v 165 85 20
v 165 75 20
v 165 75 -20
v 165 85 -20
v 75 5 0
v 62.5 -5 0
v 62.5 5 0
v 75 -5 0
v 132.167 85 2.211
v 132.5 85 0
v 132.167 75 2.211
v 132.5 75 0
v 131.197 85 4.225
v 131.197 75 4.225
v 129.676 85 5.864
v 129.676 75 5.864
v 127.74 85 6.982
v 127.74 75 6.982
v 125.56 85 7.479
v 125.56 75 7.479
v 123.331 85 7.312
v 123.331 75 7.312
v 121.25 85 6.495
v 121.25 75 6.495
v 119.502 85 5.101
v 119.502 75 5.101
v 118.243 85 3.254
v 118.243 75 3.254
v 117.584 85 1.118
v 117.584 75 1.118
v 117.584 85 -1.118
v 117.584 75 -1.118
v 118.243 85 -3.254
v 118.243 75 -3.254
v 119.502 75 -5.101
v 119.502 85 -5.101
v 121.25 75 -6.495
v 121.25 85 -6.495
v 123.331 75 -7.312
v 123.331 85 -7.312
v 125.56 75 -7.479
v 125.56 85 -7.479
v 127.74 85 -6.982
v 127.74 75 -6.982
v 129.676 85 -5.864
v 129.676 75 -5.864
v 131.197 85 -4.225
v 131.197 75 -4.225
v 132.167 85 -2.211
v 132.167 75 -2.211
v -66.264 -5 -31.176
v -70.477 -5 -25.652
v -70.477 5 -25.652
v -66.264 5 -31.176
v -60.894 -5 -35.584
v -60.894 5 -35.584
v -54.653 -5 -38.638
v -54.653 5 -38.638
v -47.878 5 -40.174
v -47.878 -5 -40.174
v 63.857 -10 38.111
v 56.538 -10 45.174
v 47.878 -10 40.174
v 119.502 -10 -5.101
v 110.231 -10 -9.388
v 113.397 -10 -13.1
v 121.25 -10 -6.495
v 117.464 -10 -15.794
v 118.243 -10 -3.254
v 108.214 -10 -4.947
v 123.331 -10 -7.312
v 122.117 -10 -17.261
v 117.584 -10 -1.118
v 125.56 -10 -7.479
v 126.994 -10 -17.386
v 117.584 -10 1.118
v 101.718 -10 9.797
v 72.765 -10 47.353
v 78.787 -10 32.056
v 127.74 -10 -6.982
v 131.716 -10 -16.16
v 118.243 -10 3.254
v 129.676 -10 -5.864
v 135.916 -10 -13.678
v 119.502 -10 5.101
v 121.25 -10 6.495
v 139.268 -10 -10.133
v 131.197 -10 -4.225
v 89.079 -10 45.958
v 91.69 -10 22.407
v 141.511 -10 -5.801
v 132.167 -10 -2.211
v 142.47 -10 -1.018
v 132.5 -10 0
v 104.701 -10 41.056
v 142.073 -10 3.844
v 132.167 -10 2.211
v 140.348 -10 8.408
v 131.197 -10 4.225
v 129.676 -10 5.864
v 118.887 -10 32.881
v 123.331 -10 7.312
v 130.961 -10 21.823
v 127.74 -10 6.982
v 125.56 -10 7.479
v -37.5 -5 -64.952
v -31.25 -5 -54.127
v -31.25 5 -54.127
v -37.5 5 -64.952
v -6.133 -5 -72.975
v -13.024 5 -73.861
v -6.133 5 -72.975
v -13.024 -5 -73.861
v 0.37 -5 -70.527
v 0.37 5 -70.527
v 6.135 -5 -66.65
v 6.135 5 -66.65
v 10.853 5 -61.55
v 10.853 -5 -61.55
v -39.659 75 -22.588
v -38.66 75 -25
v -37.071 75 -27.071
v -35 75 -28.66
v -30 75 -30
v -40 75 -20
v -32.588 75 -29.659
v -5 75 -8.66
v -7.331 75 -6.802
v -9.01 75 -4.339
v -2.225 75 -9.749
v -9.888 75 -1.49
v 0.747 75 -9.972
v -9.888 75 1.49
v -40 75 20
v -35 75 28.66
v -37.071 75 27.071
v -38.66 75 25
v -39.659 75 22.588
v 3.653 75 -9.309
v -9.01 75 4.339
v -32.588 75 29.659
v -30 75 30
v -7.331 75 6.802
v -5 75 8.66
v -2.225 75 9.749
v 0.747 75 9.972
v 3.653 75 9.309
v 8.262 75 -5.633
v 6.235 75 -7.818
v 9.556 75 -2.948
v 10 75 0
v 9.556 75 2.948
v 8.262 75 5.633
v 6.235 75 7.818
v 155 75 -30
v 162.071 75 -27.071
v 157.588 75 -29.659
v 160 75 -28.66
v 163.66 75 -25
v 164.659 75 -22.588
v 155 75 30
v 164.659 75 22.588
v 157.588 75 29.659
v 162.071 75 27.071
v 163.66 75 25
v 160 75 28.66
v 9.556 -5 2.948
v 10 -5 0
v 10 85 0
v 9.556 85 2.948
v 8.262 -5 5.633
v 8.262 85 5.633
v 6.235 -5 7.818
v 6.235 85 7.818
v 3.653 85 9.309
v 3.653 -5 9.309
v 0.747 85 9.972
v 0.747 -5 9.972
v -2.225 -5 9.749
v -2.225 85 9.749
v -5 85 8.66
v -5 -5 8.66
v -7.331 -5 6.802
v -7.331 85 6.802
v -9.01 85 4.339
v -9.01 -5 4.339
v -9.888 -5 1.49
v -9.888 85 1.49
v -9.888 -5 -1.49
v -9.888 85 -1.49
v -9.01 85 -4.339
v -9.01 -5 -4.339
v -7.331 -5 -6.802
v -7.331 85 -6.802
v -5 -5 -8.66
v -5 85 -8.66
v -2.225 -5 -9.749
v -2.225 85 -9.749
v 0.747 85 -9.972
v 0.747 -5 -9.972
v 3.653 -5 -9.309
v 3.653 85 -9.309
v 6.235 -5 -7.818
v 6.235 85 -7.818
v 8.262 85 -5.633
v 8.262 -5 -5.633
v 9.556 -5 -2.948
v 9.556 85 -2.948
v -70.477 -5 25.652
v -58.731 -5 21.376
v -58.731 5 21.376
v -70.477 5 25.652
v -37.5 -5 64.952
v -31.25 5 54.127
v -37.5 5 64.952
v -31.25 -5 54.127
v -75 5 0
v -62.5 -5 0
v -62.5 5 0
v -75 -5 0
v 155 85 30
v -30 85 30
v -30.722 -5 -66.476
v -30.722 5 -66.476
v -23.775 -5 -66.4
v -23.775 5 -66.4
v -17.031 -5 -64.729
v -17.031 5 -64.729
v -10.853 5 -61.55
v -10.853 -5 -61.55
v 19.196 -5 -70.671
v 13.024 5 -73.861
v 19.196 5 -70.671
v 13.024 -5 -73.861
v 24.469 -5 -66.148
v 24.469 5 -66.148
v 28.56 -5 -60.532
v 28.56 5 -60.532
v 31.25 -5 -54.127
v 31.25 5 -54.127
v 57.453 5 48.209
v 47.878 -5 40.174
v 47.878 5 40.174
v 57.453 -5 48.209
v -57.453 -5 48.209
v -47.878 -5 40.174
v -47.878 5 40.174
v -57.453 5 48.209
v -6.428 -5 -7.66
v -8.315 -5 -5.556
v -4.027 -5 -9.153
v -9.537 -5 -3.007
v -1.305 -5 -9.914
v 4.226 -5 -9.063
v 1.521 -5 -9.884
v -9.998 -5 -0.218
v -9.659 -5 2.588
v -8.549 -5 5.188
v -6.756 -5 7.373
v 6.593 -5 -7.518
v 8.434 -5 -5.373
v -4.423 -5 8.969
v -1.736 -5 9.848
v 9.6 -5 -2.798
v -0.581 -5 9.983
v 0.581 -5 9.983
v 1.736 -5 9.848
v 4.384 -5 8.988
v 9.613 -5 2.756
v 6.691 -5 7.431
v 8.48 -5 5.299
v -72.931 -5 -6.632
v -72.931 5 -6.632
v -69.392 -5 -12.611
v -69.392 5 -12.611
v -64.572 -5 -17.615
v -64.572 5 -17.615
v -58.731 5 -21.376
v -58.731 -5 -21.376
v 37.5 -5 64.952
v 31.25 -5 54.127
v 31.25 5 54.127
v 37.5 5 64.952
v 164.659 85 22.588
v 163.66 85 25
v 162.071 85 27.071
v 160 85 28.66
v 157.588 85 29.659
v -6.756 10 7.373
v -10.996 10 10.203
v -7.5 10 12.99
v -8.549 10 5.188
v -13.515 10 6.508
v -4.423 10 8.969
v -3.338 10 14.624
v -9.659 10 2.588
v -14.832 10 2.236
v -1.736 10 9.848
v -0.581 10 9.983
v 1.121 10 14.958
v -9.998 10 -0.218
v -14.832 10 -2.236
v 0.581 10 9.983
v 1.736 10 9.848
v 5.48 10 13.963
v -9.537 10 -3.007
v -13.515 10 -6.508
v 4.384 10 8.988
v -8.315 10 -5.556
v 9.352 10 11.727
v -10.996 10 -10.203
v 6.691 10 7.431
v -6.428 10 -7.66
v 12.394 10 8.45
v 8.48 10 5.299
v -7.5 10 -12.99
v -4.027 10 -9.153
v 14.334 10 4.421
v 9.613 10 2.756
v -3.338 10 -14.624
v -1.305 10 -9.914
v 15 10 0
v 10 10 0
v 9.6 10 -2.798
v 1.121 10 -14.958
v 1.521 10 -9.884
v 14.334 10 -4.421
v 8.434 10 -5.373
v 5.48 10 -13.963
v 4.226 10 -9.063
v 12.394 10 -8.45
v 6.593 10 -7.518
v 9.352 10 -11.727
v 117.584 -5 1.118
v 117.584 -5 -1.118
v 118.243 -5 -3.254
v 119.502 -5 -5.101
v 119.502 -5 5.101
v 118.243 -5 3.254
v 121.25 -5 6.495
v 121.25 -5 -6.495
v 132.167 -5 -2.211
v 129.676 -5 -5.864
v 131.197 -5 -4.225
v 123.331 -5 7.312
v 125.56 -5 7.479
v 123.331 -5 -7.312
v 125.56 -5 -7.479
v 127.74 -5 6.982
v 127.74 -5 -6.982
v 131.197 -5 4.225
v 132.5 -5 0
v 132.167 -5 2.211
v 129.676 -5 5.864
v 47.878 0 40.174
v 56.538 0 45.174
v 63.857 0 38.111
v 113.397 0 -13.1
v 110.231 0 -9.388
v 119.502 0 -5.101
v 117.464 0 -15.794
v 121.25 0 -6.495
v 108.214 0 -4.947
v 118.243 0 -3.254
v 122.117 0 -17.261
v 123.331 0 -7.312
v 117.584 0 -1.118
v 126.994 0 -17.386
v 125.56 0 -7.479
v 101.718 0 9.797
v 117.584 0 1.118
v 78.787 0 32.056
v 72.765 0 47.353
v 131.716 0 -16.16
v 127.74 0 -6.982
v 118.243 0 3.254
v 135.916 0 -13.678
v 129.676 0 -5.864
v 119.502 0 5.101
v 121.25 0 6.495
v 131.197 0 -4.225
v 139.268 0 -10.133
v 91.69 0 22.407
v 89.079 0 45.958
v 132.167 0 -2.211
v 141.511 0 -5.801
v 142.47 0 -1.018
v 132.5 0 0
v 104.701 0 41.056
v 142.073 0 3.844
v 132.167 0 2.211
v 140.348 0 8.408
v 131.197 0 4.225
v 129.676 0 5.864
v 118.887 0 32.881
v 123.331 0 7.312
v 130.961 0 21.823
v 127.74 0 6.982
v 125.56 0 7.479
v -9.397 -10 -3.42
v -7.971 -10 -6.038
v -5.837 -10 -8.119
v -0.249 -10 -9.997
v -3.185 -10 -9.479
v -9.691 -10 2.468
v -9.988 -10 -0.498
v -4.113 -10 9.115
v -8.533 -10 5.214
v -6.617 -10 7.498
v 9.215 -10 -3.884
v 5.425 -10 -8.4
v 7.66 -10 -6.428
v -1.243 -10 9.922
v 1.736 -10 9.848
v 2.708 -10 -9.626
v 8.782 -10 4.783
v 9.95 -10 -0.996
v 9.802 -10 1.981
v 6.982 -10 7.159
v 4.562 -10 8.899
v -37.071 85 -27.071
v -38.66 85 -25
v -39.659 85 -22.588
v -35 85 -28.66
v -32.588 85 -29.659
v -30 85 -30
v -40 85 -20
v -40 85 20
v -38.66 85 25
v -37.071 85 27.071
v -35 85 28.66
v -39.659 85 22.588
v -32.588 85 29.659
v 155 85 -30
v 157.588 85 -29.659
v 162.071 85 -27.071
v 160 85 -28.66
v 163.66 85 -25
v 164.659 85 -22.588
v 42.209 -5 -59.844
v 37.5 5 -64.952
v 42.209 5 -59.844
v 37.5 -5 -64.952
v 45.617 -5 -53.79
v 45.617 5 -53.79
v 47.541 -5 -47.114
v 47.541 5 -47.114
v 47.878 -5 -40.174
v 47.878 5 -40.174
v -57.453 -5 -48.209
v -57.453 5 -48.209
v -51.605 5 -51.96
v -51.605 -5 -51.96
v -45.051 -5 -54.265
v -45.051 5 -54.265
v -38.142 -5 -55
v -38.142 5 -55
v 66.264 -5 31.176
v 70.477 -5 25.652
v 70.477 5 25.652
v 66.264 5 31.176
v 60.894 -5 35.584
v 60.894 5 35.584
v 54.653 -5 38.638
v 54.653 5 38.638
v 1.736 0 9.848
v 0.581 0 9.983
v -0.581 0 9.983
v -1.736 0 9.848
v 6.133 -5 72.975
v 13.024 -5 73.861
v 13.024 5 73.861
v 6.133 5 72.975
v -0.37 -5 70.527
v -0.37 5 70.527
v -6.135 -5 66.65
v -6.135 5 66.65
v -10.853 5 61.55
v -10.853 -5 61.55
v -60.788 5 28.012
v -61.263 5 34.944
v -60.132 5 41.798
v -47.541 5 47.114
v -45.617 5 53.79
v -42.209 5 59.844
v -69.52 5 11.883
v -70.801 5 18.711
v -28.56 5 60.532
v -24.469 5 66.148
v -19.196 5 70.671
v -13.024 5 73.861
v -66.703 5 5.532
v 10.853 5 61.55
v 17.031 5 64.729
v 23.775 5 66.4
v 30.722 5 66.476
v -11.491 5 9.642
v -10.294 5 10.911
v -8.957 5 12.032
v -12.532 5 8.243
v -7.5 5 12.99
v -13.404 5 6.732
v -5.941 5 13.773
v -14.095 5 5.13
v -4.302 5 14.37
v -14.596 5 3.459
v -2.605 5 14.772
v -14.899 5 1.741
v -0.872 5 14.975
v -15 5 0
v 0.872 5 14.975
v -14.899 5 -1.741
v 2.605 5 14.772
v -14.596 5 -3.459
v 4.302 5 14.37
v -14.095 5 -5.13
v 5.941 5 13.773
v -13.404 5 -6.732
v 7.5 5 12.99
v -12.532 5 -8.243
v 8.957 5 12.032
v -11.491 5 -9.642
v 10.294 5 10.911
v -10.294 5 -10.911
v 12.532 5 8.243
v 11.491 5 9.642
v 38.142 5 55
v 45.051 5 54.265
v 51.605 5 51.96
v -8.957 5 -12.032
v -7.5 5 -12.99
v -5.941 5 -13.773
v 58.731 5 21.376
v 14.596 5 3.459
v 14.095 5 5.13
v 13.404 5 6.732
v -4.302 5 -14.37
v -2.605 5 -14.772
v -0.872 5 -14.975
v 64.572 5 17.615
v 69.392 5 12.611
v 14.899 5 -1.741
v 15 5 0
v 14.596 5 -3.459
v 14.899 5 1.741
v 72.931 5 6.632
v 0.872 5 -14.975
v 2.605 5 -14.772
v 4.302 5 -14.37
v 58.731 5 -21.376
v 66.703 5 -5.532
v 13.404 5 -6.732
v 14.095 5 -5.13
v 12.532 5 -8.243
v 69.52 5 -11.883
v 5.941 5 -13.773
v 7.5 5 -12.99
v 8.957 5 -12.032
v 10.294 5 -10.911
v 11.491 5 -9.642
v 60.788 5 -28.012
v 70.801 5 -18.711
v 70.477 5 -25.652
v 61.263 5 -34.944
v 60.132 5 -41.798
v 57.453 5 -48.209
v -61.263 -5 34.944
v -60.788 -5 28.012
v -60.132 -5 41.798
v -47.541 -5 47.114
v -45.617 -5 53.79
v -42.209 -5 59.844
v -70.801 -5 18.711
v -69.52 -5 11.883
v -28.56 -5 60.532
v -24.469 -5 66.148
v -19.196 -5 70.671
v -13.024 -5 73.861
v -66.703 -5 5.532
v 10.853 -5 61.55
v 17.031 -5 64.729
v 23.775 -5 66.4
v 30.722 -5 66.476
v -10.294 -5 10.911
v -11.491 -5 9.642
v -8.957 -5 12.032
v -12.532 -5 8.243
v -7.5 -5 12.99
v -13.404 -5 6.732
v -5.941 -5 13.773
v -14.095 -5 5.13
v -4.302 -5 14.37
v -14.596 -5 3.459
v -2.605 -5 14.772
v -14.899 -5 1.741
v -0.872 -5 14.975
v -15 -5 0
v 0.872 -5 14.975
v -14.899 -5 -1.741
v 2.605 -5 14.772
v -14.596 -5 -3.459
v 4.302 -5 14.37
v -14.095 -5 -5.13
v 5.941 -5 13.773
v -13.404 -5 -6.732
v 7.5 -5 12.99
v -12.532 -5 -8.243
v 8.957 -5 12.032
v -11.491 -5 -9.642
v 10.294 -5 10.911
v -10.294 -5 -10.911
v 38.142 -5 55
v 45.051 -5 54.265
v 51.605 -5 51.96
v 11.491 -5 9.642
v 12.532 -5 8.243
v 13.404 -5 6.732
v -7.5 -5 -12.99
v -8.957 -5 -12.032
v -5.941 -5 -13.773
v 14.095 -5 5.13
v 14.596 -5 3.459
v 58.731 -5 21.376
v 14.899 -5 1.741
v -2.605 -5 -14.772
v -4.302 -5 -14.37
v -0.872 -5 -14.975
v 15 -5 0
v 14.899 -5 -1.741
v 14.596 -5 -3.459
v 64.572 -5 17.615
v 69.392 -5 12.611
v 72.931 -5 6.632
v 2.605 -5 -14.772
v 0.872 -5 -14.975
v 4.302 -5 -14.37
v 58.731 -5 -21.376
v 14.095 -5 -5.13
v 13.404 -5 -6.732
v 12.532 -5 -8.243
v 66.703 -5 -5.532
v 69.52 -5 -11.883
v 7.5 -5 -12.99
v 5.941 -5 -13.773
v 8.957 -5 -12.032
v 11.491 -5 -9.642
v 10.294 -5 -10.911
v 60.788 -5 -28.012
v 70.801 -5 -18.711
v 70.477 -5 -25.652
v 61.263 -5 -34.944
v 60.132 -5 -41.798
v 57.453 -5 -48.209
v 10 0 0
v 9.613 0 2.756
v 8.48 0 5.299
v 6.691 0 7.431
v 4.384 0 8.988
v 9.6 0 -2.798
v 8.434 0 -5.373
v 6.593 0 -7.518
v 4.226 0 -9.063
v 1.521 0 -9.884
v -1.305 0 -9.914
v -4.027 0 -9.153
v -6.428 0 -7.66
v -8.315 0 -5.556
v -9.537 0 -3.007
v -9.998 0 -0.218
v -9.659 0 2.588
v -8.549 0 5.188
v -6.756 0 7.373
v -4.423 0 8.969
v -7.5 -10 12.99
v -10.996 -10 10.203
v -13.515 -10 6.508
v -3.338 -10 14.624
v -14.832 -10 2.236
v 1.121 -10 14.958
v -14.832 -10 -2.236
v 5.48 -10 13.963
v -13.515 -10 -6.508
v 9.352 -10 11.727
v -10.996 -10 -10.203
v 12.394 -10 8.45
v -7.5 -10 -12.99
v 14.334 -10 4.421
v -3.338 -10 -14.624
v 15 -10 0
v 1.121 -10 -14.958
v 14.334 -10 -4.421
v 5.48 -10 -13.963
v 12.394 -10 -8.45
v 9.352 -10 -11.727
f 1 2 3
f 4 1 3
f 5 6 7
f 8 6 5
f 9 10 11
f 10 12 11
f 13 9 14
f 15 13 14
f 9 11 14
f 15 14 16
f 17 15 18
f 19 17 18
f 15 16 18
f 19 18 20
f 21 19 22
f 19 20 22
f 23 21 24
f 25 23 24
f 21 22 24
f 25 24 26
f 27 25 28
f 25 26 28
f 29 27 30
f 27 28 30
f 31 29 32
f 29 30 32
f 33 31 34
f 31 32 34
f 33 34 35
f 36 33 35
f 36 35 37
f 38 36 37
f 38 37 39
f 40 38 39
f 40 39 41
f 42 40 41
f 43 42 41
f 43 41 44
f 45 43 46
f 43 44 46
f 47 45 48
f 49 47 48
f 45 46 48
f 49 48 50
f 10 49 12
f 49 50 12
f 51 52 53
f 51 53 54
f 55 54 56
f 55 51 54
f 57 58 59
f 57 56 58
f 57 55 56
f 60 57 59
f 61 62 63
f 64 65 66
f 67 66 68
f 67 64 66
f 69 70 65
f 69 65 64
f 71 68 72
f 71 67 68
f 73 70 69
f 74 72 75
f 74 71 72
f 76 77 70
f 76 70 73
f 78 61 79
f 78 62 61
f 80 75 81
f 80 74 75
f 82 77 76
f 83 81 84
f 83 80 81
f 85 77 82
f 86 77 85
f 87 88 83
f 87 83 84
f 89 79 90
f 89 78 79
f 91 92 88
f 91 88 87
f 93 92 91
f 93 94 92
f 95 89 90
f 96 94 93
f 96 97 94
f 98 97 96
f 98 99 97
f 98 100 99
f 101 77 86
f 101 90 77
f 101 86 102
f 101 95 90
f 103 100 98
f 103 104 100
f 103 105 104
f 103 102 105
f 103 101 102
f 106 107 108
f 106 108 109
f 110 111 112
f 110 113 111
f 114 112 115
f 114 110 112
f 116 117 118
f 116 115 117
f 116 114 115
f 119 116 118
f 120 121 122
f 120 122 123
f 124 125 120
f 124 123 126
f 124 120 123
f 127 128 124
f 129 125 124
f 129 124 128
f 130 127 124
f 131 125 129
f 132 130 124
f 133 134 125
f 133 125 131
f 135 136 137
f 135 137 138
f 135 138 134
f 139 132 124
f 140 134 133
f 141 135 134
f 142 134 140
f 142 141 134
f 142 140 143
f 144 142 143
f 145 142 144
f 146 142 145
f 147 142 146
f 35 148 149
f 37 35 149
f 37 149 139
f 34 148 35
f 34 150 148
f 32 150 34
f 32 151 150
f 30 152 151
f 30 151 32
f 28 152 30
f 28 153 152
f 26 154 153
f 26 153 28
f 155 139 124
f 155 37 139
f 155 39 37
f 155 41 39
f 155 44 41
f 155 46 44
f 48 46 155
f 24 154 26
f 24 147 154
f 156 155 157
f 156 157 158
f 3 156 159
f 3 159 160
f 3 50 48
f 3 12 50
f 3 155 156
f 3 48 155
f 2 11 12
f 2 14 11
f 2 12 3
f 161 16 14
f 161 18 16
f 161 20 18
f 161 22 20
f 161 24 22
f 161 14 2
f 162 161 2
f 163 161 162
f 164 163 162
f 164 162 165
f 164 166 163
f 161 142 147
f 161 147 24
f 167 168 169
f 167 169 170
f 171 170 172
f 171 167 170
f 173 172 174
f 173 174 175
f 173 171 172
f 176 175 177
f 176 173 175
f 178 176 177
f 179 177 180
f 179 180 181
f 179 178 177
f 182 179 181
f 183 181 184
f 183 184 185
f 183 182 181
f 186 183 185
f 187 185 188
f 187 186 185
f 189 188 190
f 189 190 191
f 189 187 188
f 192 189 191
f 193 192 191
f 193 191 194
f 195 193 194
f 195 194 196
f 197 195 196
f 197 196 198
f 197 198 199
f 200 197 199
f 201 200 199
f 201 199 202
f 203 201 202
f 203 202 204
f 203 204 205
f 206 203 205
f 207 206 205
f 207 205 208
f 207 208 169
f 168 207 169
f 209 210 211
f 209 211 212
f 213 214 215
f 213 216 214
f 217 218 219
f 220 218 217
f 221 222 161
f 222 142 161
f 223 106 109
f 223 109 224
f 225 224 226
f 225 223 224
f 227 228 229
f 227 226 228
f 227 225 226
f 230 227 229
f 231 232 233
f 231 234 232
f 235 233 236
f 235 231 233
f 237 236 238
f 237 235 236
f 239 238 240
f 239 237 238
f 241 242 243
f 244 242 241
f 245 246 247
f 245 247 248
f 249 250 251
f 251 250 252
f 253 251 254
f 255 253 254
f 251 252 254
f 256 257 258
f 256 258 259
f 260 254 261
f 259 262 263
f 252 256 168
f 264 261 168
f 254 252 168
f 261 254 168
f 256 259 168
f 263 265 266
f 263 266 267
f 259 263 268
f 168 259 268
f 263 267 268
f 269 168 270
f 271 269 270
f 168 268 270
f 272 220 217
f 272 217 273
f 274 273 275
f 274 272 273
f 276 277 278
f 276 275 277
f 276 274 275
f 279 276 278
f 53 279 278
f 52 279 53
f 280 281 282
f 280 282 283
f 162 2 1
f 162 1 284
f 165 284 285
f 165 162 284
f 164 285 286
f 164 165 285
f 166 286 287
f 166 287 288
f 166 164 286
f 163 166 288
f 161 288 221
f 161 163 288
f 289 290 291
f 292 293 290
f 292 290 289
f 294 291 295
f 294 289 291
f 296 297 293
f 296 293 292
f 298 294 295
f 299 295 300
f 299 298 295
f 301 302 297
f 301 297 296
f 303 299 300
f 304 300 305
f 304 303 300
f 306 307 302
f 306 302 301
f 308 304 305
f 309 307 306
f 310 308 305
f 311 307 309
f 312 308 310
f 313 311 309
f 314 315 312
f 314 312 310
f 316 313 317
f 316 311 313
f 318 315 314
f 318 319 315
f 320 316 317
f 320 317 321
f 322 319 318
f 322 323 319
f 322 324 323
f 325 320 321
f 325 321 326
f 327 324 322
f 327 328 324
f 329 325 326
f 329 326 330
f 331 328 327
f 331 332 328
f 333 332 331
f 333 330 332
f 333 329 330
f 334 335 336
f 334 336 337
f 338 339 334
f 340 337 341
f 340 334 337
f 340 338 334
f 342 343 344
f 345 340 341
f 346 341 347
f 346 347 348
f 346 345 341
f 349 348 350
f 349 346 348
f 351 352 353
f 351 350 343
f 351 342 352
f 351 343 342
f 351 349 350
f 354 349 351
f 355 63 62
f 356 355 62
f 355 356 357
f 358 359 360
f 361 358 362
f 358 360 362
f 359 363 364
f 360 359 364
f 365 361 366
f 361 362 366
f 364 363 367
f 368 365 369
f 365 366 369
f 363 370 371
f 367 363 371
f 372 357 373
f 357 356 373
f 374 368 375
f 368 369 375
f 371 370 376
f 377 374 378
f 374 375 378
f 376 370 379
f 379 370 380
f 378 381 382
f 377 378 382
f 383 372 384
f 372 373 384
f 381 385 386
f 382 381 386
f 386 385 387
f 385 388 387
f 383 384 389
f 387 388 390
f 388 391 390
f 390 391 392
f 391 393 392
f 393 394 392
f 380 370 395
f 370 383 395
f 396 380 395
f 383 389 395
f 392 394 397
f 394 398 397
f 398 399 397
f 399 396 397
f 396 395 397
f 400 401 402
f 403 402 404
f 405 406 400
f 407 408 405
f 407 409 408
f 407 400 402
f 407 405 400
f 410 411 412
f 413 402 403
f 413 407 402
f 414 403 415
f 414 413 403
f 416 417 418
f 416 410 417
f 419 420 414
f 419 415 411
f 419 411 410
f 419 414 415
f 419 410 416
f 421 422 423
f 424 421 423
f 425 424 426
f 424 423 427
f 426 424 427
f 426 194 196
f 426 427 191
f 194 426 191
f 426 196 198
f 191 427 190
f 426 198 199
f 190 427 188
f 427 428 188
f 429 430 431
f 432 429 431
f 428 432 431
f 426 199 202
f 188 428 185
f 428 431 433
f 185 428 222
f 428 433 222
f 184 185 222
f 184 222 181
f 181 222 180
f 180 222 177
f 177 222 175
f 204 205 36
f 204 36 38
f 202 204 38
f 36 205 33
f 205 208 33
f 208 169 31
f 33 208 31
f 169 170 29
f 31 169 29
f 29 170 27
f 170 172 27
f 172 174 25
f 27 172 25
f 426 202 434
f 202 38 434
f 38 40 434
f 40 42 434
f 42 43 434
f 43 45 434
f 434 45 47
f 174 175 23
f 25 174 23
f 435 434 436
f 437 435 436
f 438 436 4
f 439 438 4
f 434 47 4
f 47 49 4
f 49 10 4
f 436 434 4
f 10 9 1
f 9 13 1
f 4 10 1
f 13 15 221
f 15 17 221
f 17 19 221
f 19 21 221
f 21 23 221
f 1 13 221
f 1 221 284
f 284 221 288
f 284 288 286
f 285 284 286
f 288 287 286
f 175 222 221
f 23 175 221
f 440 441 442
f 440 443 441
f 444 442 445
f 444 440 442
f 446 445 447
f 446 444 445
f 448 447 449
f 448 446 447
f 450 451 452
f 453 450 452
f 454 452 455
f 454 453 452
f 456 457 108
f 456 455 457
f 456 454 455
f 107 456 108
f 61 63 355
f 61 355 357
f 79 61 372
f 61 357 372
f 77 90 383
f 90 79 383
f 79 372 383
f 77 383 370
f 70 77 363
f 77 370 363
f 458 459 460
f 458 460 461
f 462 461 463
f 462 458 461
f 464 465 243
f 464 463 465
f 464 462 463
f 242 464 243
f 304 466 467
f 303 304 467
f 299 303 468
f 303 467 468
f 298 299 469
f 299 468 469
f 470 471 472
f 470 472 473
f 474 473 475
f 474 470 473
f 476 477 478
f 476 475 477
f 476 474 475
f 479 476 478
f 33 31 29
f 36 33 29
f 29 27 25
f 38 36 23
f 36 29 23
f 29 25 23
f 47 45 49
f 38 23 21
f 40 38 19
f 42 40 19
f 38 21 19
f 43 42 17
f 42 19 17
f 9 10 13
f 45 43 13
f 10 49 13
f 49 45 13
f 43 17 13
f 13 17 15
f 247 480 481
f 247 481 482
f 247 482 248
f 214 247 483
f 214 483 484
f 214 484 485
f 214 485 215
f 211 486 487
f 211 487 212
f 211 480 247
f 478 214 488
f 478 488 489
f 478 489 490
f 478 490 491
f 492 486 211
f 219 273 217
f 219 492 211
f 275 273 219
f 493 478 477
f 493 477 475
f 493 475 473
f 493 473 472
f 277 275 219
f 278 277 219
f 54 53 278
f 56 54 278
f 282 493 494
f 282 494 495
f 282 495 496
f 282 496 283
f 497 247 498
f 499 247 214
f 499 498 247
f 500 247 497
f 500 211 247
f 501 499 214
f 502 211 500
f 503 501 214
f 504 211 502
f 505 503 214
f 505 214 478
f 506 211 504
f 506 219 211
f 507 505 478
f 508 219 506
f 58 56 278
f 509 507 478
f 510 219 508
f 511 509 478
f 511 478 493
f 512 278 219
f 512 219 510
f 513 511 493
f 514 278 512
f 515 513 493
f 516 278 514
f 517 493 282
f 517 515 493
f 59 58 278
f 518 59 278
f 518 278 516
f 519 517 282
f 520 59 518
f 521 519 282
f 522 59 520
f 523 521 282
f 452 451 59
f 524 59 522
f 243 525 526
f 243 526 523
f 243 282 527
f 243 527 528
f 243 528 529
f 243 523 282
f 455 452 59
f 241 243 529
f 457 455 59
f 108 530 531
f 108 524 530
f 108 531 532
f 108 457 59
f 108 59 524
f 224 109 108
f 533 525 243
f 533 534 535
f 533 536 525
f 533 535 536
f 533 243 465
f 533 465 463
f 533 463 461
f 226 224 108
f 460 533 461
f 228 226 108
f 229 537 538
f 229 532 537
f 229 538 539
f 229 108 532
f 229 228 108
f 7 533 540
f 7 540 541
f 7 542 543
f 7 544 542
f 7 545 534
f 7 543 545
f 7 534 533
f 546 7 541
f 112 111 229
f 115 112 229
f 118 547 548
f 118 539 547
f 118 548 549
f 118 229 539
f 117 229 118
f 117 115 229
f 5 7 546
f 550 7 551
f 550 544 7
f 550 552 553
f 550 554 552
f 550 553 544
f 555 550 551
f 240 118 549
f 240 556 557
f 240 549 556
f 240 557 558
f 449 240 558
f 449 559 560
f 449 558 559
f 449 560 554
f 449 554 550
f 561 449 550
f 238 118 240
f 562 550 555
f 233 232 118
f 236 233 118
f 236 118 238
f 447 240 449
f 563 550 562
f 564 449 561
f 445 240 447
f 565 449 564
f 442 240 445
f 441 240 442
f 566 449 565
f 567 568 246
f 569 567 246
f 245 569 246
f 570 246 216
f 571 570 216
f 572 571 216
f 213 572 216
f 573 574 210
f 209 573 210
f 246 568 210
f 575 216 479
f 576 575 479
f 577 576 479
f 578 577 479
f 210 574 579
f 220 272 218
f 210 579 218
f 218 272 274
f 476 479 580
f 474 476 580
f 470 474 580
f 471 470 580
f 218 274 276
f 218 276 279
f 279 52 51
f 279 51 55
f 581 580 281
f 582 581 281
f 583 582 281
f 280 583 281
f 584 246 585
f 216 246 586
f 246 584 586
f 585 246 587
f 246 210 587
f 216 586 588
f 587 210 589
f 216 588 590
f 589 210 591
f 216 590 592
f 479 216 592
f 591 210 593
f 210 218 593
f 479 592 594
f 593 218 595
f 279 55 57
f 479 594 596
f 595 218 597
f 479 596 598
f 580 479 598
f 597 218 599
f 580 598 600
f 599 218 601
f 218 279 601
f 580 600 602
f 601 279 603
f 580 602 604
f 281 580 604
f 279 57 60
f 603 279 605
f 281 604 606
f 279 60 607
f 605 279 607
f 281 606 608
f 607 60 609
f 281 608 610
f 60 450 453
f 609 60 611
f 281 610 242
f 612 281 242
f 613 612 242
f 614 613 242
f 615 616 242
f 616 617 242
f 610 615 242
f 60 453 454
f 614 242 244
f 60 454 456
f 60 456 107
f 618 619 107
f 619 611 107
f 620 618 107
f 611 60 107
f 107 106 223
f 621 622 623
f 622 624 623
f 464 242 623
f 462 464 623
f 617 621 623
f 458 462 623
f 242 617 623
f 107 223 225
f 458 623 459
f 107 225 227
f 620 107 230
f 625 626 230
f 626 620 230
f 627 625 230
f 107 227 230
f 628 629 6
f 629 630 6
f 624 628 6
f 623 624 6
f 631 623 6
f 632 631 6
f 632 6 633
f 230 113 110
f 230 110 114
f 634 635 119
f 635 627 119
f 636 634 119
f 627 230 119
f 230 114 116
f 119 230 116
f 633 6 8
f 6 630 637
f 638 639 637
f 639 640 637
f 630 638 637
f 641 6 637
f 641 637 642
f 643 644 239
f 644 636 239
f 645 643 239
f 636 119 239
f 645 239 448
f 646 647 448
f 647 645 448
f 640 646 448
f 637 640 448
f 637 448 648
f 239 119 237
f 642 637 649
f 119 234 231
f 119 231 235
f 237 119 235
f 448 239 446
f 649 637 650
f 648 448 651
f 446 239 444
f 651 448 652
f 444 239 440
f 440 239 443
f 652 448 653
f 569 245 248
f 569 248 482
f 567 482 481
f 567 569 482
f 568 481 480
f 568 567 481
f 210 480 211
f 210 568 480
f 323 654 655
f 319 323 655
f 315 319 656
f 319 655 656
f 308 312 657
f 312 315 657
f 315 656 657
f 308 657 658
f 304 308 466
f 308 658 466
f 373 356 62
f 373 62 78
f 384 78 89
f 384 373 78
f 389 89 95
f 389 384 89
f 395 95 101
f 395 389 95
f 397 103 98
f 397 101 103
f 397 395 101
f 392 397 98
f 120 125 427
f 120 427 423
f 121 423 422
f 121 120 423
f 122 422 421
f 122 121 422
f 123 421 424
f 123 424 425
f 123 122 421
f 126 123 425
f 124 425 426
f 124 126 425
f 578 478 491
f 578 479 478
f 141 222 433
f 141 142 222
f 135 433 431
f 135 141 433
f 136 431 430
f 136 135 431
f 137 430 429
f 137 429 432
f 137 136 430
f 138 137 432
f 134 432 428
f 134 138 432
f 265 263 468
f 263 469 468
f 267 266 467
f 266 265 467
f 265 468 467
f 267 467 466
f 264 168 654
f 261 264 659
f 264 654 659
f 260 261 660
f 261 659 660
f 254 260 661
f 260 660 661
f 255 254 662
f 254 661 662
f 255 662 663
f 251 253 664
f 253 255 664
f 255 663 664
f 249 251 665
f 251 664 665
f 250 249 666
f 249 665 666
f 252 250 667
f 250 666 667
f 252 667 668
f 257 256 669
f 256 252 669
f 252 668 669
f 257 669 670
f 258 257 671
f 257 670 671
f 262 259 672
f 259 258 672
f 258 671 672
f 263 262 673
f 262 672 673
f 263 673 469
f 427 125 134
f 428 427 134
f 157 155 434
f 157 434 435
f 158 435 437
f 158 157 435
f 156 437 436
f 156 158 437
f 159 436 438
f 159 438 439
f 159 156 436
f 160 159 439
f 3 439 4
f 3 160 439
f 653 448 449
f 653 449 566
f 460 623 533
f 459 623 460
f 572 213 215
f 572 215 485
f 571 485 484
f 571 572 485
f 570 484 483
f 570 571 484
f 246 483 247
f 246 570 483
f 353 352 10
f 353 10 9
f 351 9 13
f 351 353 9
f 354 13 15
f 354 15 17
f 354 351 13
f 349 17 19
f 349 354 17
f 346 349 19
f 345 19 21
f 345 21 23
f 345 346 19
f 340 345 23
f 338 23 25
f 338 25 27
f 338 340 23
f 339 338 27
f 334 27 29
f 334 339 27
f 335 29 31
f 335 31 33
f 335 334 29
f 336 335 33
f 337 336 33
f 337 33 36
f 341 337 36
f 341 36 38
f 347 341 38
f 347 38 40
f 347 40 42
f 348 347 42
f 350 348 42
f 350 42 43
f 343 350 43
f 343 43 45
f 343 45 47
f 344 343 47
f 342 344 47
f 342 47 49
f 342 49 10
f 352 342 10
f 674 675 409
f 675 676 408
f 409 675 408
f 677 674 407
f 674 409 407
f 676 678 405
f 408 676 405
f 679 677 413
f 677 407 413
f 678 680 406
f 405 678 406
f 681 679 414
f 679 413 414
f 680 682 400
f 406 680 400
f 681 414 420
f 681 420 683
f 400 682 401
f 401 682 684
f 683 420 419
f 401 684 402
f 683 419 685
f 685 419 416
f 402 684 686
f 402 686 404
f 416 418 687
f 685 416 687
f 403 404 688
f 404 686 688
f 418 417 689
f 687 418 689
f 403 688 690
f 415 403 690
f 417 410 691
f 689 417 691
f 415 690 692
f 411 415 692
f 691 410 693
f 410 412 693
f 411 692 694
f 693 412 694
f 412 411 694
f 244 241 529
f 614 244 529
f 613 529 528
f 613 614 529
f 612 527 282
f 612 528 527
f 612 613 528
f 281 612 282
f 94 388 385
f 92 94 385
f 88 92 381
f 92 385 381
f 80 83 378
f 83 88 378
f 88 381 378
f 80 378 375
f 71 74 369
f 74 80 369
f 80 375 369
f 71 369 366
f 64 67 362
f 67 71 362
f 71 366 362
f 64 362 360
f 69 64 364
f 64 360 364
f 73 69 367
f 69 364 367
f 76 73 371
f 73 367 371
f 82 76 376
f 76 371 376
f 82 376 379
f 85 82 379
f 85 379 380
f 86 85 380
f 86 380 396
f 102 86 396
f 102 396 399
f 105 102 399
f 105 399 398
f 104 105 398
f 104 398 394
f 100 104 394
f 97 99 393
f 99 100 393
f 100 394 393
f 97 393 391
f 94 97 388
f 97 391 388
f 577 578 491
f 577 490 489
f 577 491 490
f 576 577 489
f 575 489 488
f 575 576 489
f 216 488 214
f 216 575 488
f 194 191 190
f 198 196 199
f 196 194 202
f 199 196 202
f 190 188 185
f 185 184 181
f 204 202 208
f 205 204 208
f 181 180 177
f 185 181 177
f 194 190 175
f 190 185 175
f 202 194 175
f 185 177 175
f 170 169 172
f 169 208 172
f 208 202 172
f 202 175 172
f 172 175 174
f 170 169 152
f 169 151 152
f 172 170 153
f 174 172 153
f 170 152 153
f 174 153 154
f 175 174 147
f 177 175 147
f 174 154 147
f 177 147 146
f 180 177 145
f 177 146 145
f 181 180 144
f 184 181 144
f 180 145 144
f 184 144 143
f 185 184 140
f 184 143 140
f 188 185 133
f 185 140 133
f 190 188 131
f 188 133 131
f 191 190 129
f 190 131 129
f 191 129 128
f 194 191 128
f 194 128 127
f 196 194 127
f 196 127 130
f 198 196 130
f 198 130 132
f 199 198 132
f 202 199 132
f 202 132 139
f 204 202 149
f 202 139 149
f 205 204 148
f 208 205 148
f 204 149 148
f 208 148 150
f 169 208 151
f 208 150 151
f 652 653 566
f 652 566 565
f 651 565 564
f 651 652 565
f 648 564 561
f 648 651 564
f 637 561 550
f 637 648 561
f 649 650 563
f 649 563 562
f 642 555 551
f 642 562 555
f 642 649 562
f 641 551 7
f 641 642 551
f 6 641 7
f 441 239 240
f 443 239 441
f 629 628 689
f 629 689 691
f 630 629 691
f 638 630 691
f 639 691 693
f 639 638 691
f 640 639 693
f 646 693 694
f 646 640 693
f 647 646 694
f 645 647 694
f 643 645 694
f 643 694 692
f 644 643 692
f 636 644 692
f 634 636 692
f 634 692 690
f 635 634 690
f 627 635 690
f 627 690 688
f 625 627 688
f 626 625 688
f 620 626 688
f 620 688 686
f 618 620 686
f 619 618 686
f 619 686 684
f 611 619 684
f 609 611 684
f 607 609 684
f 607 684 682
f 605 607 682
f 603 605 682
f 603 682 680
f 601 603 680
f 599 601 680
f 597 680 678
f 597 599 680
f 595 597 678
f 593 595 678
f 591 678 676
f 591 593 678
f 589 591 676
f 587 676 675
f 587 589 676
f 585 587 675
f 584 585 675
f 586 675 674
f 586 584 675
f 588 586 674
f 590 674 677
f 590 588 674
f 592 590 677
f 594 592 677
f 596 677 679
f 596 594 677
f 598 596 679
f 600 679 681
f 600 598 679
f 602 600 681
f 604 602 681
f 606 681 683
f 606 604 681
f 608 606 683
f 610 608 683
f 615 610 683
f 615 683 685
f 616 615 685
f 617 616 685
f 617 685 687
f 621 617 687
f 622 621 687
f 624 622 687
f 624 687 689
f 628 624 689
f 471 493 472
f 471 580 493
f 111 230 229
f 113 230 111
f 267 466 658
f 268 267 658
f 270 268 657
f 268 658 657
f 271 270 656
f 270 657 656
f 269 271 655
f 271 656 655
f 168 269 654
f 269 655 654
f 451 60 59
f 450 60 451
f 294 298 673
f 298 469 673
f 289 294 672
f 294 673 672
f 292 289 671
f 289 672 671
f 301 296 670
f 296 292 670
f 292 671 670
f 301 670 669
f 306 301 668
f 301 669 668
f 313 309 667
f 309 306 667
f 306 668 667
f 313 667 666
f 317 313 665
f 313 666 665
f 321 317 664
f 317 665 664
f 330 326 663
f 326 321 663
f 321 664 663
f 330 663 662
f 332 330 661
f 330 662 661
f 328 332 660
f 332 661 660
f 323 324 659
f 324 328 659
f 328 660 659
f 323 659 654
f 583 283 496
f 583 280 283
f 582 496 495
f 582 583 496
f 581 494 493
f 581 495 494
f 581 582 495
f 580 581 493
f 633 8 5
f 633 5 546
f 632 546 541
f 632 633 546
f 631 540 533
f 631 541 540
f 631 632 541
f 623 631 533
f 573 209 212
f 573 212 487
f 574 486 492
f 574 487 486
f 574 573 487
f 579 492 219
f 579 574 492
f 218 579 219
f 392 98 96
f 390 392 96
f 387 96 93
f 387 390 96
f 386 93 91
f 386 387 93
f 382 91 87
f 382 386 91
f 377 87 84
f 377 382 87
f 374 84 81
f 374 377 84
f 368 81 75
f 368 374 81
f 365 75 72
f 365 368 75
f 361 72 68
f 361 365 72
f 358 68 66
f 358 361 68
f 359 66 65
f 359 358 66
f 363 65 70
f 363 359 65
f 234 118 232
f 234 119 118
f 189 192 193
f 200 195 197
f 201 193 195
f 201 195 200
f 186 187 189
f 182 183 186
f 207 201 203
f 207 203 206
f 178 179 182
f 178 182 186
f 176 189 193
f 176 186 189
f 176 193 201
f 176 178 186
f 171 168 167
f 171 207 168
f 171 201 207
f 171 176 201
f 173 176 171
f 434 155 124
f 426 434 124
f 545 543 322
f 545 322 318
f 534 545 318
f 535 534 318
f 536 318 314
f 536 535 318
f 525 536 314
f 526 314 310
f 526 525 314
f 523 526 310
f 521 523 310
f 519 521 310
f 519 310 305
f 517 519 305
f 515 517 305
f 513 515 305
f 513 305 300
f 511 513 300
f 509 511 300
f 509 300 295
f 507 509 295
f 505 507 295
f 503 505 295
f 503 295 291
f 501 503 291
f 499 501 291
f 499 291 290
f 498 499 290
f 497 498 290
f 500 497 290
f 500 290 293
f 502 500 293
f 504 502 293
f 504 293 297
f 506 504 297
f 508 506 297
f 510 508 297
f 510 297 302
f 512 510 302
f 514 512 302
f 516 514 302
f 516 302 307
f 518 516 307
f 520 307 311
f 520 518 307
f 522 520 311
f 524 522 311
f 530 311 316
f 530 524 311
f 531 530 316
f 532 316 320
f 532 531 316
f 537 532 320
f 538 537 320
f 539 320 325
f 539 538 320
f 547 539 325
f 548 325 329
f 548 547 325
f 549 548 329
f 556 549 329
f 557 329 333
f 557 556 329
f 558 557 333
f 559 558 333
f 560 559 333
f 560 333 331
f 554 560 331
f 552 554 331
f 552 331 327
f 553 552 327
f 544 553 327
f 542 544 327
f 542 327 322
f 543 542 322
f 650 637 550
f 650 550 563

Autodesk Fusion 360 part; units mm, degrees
sketch "Sketch1" plane through (0, 0, 0) normal (0, 1, 0) x (1, 0, 0) in component "ratchet"
  circle A0 centre (0, 0) radius 62.5
  circle A1 centre (0, 0) radius 10
  circle A2 centre (0, 0) radius 15
  circle A3 centre (0, 0) radius 75
  line L0 (0, 0) -> (13.0236, -73.8606)
  line L1 (0, 0) -> (75, 0) construction
  line L2 (0, 0) -> (-10.853, -61.5505)
  arc A4 (-10.853, -61.5505) -> (13.0236, -73.8606) centre (13.378, -43.8627) ccw
  dimension "d1" = 125
  dimension "d2" = 20
  dimension "d3" = 30
  dimension "d4" = 12.5
  dimension "d5" = 80
  dimension "d6" = 20
  dimension "d7" = 30
extrude "Extrude1" add sketch "Sketch1" along normal mid plane 10 contours A0 A2 L0 L2 | A0 L0 A4 picked at (5.1197, -46.3065) makes body 1 in component "ratchet"
pattern_circular "C-Pattern1" count 18 over 360 about axis through (0, -5, 0) along (0, 1, 0) of bodies 1 makes body 2 at (18.6177, 5, 46.4976) makes body 3 at (33.398, -5, 37.3258) makes body 4 at (44.15, 5, 23.652) makes body 5 at (49.5769, 5, 7.1254) makes body 6 at (49.0241, 5, -10.2606) makes body 7 at (42.5583, 5, -26.409) makes body 8 at (30.9593, 5, -39.3722) makes body 9 at (15.6261, 5, -47.5864) makes body 10 at (-1.5918, 5, -50.0611) makes body 11 at (-18.6177, 5, -46.4976) makes body 12 at (-33.398, 5, -37.3258) makes body 13 at (-44.15, 5, -23.652) makes body 14 at (-49.5769, 5, -7.1254) makes body 15 at (-49.0241, 5, 10.2606) makes body 16 at (-42.5583, 5, 26.409) makes body 17 at (-30.9593, 5, 39.3722) makes body 18 at (-15.6261, 5, 47.5864) in component "ratchet"
extrude "Extrude2" add sketch "Sketch1" along normal mid plane 20 contours A1 A2 L0 L2 | A1 A2 L0 L2 bodies 1 2 3 4 5 6 7 8 9 10 11 12 13 14 15 16 17 18 in component "ratchet"
sketch "Sketch1 (2)" plane through (0, -5, 0) normal (0, -1, 0) x (1, 0, 0) in component "paw"
  line L0 (-31.25, 54.1266) -> (-37.5, 64.9519)
  arc A0 (-37.5, 64.9519) -> (-47.8778, 40.1742) centre (-17.9462, 42.2) ccw
  line L1 (-47.8778, 40.1742) -> (-57.4533, 48.2091)
  arc A1 (-57.4533, 48.2091) -> (-58.7308, 21.3763) centre (-31.2972, 33.517) ccw
  line L2 (-58.7308, 21.3763) -> (-70.4769, 25.6515)
  arc A2 (-70.4769, 25.6515) -> (-62.5, 0) centre (-40.8732, 20.7914) ccw
  line L3 (-62.5, 0) -> (-75, 0)
  arc A3 (-75, 0) -> (-58.7308, -21.3763) centre (-45.5194, 5.5581) ccw
  line L4 (-58.7308, -21.3763) -> (-70.4769, -25.6515)
  arc A4 (-70.4769, -25.6515) -> (-47.8778, -40.1742) centre (-44.6752, -10.3457) ccw
  line L5 (-47.8778, -40.1742) -> (-57.4533, -48.2091)
  arc A5 (-57.4533, -48.2091) -> (-31.25, -54.1266) centre (-38.4425, -25.0016) ccw
  line L6 (-31.25, -54.1266) -> (-37.5, -64.9519)
  arc A6 (-37.5, -64.9519) -> (-10.853, -61.5505) centre (-27.5731, -36.6419) ccw
  line L7 (-10.853, -61.5505) -> (-13.0236, -73.8606)
  arc A7 (-13.0236, -73.8606) -> (10.853, -61.5505) centre (-13.378, -43.8627) ccw
  line L8 (10.853, -61.5505) -> (13.0236, -73.8606)
  arc A8 (13.0236, -73.8606) -> (31.25, -54.1266) centre (2.4307, -45.793) ccw
  line L9 (31.25, -54.1266) -> (37.5, -64.9519)
  arc A9 (37.5, -64.9519) -> (47.8778, -40.1742) centre (17.9462, -42.2) ccw
  line L10 (47.8778, -40.1742) -> (57.4533, -48.2091)
  arc A10 (57.4533, -48.2091) -> (58.7308, -21.3763) centre (31.2972, -33.517) ccw
  line L11 (58.7308, -21.3763) -> (70.4769, -25.6515)
  arc A11 (70.4769, -25.6515) -> (62.5, 0) centre (40.8732, -20.7914) ccw
  line L12 (62.5, 0) -> (75, 0)
  arc A12 (75, 0) -> (58.7308, 21.3763) centre (45.5194, -5.5581) ccw
  line L13 (58.7308, 21.3763) -> (70.4769, 25.6515)
  arc A13 (70.4769, 25.6515) -> (47.8778, 40.1742) centre (44.6752, 10.3457) ccw
  line L14 (47.8778, 40.1742) -> (57.4533, 48.2091)
  arc A14 (57.4533, 48.2091) -> (31.25, 54.1266) centre (38.4425, 25.0016) ccw
  line L15 (31.25, 54.1266) -> (37.5, 64.9519)
  arc A15 (37.5, 64.9519) -> (10.853, 61.5505) centre (27.5731, 36.6419) ccw
  line L16 (10.853, 61.5505) -> (13.0236, 73.8606)
  arc A16 (13.0236, 73.8606) -> (-10.853, 61.5505) centre (13.378, 43.8627) ccw
  line L17 (-10.853, 61.5505) -> (-13.0236, 73.8606)
  arc A17 (-13.0236, 73.8606) -> (-31.25, 54.1266) centre (-2.4307, 45.793) ccw
  circle A18 centre (0, 0) radius 15
  circle A19 centre (0, 0) radius 10
  line L18 (-13.0236, 73.8606) -> (-10.853, 61.5505)
  arc A20 (-13.0236, 73.8606) -> (-31.25, 54.1266) centre (-2.4307, 45.793) ccw
  line L19 (-37.5, 64.9519) -> (-31.25, 54.1266)
  arc A21 (-37.5, 64.9519) -> (-47.8778, 40.1742) centre (-17.9462, 42.2) ccw
  line L20 (-57.4533, 48.2091) -> (-47.8778, 40.1742)
  arc A22 (-57.4533, 48.2091) -> (-58.7308, 21.3763) centre (-31.2972, 33.517) ccw
  line L21 (-70.4769, 25.6515) -> (-58.7308, 21.3763)
  arc A23 (-70.4769, 25.6515) -> (-62.5, 0) centre (-40.8732, 20.7914) ccw
  line L22 (-75, 0) -> (-62.5, 0)
  arc A24 (-75, 0) -> (-58.7308, -21.3763) centre (-45.5194, 5.5581) ccw
  line L23 (-70.4769, -25.6515) -> (-58.7308, -21.3763)
  arc A25 (-70.4769, -25.6515) -> (-47.8778, -40.1742) centre (-44.6752, -10.3457) ccw
  line L24 (-57.4533, -48.2091) -> (-47.8778, -40.1742)
  arc A26 (-57.4533, -48.2091) -> (-31.25, -54.1266) centre (-38.4425, -25.0016) ccw
  line L25 (-37.5, -64.9519) -> (-31.25, -54.1266)
  arc A27 (-37.5, -64.9519) -> (-10.853, -61.5505) centre (-27.5731, -36.6419) ccw
  line L26 (-13.0236, -73.8606) -> (-10.853, -61.5505)
  arc A28 (-13.0236, -73.8606) -> (10.853, -61.5505) centre (-13.378, -43.8627) ccw
  line L27 (13.0236, -73.8606) -> (10.853, -61.5505)
  arc A29 (13.0236, -73.8606) -> (31.25, -54.1266) centre (2.4307, -45.793) ccw
  line L28 (37.5, -64.9519) -> (31.25, -54.1266)
  arc A30 (37.5, -64.9519) -> (47.8778, -40.1742) centre (17.9462, -42.2) ccw
  line L29 (57.4533, -48.2091) -> (47.8778, -40.1742)
  arc A31 (57.4533, -48.2091) -> (58.7308, -21.3763) centre (31.2972, -33.517) ccw
  line L30 (70.4769, -25.6515) -> (58.7308, -21.3763)
  arc A32 (70.4769, -25.6515) -> (62.5, 0) centre (40.8732, -20.7914) ccw
  line L31 (75, 0) -> (62.5, 0)
  arc A33 (75, 0) -> (58.7308, 21.3763) centre (45.5194, -5.5581) ccw
  line L32 (70.4769, 25.6515) -> (58.7308, 21.3763)
  arc A34 (70.4769, 25.6515) -> (47.8778, 40.1742) centre (44.6752, 10.3457) ccw
  line L33 (57.4533, 48.2091) -> (47.8778, 40.1742)
  arc A35 (57.4533, 48.2091) -> (31.25, 54.1266) centre (38.4425, 25.0016) ccw
  line L34 (37.5, 64.9519) -> (31.25, 54.1266)
  arc A36 (37.5, 64.9519) -> (10.853, 61.5505) centre (27.5731, 36.6419) ccw
  line L35 (13.0236, 73.8606) -> (10.853, 61.5505)
  arc A37 (13.0236, 73.8606) -> (-10.853, 61.5505) centre (13.378, 43.8627) ccw
  circle A38 centre (125, 0) radius 7.5
  circle A39 centre (125, 0) radius 17.5
  line L36 (47.8778, 40.1742) -> (149.9857, 40.1742) construction
  line L37 (47.8778, 40.1742) -> (56.538, 45.1742)
  arc A40 (108.2137, -4.9467) -> (47.8778, 40.1742) centre (47.8778, -22.727) ccw
  arc A41 (140.3479, 8.4078) -> (56.538, 45.1742) centre (74.5711, -27.6256) ccw
  dimension "d14" = 15
  dimension "d15" = 35
  dimension "d16" = 10
  dimension "d17" = 125
  dimension "d18" = 75
  dimension "d19" = 30
extrude "Extrude1'" add sketch "Sketch1 (2)" along normal mid plane 10 separate body contours A39 L37 A40 A41 | A39 makes body 19 in component "paw"
sketch "Sketch1 (3)" plane through (0, -5, 0) normal (0, -1, 0) x (1, 0, 0) in component "base"
  line L0 (-31.25, 54.1266) -> (-37.5, 64.9519)
  arc A0 (-37.5, 64.9519) -> (-47.8778, 40.1742) centre (-17.9462, 42.2) ccw
  line L1 (-47.8778, 40.1742) -> (-57.4533, 48.2091)
  arc A1 (-57.4533, 48.2091) -> (-58.7308, 21.3763) centre (-31.2972, 33.517) ccw
  line L2 (-58.7308, 21.3763) -> (-70.4769, 25.6515)
  arc A2 (-70.4769, 25.6515) -> (-62.5, 0) centre (-40.8732, 20.7914) ccw
  line L3 (-62.5, 0) -> (-75, 0)
  arc A3 (-75, 0) -> (-58.7308, -21.3763) centre (-45.5194, 5.5581) ccw
  line L4 (-58.7308, -21.3763) -> (-70.4769, -25.6515)
  arc A4 (-70.4769, -25.6515) -> (-47.8778, -40.1742) centre (-44.6752, -10.3457) ccw
  line L5 (-47.8778, -40.1742) -> (-57.4533, -48.2091)
  arc A5 (-57.4533, -48.2091) -> (-31.25, -54.1266) centre (-38.4425, -25.0016) ccw
  line L6 (-31.25, -54.1266) -> (-37.5, -64.9519)
  arc A6 (-37.5, -64.9519) -> (-10.853, -61.5505) centre (-27.5731, -36.6419) ccw
  line L7 (-10.853, -61.5505) -> (-13.0236, -73.8606)
  arc A7 (-13.0236, -73.8606) -> (10.853, -61.5505) centre (-13.378, -43.8627) ccw
  line L8 (10.853, -61.5505) -> (13.0236, -73.8606)
  arc A8 (13.0236, -73.8606) -> (31.25, -54.1266) centre (2.4307, -45.793) ccw
  line L9 (31.25, -54.1266) -> (37.5, -64.9519)
  arc A9 (37.5, -64.9519) -> (47.8778, -40.1742) centre (17.9462, -42.2) ccw
  line L10 (47.8778, -40.1742) -> (57.4533, -48.2091)
  arc A10 (57.4533, -48.2091) -> (58.7308, -21.3763) centre (31.2972, -33.517) ccw
  line L11 (58.7308, -21.3763) -> (70.4769, -25.6515)
  arc A11 (70.4769, -25.6515) -> (62.5, 0) centre (40.8732, -20.7914) ccw
  line L12 (62.5, 0) -> (75, 0)
  arc A12 (75, 0) -> (58.7308, 21.3763) centre (45.5194, -5.5581) ccw
  line L13 (58.7308, 21.3763) -> (70.4769, 25.6515)
  arc A13 (70.4769, 25.6515) -> (47.8778, 40.1742) centre (44.6752, 10.3457) ccw
  line L14 (47.8778, 40.1742) -> (57.4533, 48.2091)
  arc A14 (57.4533, 48.2091) -> (31.25, 54.1266) centre (38.4425, 25.0016) ccw
  line L15 (31.25, 54.1266) -> (37.5, 64.9519)
  arc A15 (37.5, 64.9519) -> (10.853, 61.5505) centre (27.5731, 36.6419) ccw
  line L16 (10.853, 61.5505) -> (13.0236, 73.8606)
  arc A16 (13.0236, 73.8606) -> (-10.853, 61.5505) centre (13.378, 43.8627) ccw
  line L17 (-10.853, 61.5505) -> (-13.0236, 73.8606)
  arc A17 (-13.0236, 73.8606) -> (-31.25, 54.1266) centre (-2.4307, 45.793) ccw
  circle A18 centre (0, 0) radius 15
  line L18 (-30, 30) -> (155, 30)
  line L19 (165, 20) -> (165, -20)
  line L20 (155, -30) -> (-30, -30)
  line L21 (-40, -20) -> (-40, 20)
  circle A19 centre (125, 0) radius 7.5
  arc A20 (-30, 30) -> (-40, 20) centre (-30, 20) ccw
  arc A21 (-40, -20) -> (-30, -30) centre (-30, -20) ccw
  arc A22 (165, 20) -> (155, 30) centre (155, 20) ccw
  arc A23 (155, -30) -> (165, -20) centre (155, -20) ccw
  circle A24 centre (0, 0) radius 10
  dimension "d22" = 40
  dimension "d23" = 30
  dimension "d24" = 30
  dimension "d25" = 40
  dimension "d26" = 10
extrude "Extrude1''" add sketch "Sketch1 (3)" against normal blind 10 from surface at -80 separate body contours A10 L11 A11 L12 A12 L13 A13 L18 L19 L20 A22 A23 | A10 L11 A11 L12 A12 L13 A13 L18 L20 L21 A20 A21 | A18 makes body 20 in component "base"
extrude "Extrude2'" add sketch "Sketch1 (3)" against normal blind 90 separate body contours A19 | A24 makes body 21 at (9.9876, 55, -0.4985) makes body 22 at (132.4907, 55, -0.3738) in component "base"
extrude "Extrude3" add sketch "Sketch1 (3)" along normal blind 5 contours A24 bodies 1 in component "ratchet"
component "paw" placed x (1, 0, 0) y (0, 1, 0) z (0, 0, 1) at (0, 0, 0)
component "base" placed x (1, 0, 0) y (0, 1, 0) z (0, 0, 1) at (0, 0, 0)
component "ratchet" placed x (1, 0, 0) y (0, 1, 0) z (0, 0, 1) at (0, 0, 0)
